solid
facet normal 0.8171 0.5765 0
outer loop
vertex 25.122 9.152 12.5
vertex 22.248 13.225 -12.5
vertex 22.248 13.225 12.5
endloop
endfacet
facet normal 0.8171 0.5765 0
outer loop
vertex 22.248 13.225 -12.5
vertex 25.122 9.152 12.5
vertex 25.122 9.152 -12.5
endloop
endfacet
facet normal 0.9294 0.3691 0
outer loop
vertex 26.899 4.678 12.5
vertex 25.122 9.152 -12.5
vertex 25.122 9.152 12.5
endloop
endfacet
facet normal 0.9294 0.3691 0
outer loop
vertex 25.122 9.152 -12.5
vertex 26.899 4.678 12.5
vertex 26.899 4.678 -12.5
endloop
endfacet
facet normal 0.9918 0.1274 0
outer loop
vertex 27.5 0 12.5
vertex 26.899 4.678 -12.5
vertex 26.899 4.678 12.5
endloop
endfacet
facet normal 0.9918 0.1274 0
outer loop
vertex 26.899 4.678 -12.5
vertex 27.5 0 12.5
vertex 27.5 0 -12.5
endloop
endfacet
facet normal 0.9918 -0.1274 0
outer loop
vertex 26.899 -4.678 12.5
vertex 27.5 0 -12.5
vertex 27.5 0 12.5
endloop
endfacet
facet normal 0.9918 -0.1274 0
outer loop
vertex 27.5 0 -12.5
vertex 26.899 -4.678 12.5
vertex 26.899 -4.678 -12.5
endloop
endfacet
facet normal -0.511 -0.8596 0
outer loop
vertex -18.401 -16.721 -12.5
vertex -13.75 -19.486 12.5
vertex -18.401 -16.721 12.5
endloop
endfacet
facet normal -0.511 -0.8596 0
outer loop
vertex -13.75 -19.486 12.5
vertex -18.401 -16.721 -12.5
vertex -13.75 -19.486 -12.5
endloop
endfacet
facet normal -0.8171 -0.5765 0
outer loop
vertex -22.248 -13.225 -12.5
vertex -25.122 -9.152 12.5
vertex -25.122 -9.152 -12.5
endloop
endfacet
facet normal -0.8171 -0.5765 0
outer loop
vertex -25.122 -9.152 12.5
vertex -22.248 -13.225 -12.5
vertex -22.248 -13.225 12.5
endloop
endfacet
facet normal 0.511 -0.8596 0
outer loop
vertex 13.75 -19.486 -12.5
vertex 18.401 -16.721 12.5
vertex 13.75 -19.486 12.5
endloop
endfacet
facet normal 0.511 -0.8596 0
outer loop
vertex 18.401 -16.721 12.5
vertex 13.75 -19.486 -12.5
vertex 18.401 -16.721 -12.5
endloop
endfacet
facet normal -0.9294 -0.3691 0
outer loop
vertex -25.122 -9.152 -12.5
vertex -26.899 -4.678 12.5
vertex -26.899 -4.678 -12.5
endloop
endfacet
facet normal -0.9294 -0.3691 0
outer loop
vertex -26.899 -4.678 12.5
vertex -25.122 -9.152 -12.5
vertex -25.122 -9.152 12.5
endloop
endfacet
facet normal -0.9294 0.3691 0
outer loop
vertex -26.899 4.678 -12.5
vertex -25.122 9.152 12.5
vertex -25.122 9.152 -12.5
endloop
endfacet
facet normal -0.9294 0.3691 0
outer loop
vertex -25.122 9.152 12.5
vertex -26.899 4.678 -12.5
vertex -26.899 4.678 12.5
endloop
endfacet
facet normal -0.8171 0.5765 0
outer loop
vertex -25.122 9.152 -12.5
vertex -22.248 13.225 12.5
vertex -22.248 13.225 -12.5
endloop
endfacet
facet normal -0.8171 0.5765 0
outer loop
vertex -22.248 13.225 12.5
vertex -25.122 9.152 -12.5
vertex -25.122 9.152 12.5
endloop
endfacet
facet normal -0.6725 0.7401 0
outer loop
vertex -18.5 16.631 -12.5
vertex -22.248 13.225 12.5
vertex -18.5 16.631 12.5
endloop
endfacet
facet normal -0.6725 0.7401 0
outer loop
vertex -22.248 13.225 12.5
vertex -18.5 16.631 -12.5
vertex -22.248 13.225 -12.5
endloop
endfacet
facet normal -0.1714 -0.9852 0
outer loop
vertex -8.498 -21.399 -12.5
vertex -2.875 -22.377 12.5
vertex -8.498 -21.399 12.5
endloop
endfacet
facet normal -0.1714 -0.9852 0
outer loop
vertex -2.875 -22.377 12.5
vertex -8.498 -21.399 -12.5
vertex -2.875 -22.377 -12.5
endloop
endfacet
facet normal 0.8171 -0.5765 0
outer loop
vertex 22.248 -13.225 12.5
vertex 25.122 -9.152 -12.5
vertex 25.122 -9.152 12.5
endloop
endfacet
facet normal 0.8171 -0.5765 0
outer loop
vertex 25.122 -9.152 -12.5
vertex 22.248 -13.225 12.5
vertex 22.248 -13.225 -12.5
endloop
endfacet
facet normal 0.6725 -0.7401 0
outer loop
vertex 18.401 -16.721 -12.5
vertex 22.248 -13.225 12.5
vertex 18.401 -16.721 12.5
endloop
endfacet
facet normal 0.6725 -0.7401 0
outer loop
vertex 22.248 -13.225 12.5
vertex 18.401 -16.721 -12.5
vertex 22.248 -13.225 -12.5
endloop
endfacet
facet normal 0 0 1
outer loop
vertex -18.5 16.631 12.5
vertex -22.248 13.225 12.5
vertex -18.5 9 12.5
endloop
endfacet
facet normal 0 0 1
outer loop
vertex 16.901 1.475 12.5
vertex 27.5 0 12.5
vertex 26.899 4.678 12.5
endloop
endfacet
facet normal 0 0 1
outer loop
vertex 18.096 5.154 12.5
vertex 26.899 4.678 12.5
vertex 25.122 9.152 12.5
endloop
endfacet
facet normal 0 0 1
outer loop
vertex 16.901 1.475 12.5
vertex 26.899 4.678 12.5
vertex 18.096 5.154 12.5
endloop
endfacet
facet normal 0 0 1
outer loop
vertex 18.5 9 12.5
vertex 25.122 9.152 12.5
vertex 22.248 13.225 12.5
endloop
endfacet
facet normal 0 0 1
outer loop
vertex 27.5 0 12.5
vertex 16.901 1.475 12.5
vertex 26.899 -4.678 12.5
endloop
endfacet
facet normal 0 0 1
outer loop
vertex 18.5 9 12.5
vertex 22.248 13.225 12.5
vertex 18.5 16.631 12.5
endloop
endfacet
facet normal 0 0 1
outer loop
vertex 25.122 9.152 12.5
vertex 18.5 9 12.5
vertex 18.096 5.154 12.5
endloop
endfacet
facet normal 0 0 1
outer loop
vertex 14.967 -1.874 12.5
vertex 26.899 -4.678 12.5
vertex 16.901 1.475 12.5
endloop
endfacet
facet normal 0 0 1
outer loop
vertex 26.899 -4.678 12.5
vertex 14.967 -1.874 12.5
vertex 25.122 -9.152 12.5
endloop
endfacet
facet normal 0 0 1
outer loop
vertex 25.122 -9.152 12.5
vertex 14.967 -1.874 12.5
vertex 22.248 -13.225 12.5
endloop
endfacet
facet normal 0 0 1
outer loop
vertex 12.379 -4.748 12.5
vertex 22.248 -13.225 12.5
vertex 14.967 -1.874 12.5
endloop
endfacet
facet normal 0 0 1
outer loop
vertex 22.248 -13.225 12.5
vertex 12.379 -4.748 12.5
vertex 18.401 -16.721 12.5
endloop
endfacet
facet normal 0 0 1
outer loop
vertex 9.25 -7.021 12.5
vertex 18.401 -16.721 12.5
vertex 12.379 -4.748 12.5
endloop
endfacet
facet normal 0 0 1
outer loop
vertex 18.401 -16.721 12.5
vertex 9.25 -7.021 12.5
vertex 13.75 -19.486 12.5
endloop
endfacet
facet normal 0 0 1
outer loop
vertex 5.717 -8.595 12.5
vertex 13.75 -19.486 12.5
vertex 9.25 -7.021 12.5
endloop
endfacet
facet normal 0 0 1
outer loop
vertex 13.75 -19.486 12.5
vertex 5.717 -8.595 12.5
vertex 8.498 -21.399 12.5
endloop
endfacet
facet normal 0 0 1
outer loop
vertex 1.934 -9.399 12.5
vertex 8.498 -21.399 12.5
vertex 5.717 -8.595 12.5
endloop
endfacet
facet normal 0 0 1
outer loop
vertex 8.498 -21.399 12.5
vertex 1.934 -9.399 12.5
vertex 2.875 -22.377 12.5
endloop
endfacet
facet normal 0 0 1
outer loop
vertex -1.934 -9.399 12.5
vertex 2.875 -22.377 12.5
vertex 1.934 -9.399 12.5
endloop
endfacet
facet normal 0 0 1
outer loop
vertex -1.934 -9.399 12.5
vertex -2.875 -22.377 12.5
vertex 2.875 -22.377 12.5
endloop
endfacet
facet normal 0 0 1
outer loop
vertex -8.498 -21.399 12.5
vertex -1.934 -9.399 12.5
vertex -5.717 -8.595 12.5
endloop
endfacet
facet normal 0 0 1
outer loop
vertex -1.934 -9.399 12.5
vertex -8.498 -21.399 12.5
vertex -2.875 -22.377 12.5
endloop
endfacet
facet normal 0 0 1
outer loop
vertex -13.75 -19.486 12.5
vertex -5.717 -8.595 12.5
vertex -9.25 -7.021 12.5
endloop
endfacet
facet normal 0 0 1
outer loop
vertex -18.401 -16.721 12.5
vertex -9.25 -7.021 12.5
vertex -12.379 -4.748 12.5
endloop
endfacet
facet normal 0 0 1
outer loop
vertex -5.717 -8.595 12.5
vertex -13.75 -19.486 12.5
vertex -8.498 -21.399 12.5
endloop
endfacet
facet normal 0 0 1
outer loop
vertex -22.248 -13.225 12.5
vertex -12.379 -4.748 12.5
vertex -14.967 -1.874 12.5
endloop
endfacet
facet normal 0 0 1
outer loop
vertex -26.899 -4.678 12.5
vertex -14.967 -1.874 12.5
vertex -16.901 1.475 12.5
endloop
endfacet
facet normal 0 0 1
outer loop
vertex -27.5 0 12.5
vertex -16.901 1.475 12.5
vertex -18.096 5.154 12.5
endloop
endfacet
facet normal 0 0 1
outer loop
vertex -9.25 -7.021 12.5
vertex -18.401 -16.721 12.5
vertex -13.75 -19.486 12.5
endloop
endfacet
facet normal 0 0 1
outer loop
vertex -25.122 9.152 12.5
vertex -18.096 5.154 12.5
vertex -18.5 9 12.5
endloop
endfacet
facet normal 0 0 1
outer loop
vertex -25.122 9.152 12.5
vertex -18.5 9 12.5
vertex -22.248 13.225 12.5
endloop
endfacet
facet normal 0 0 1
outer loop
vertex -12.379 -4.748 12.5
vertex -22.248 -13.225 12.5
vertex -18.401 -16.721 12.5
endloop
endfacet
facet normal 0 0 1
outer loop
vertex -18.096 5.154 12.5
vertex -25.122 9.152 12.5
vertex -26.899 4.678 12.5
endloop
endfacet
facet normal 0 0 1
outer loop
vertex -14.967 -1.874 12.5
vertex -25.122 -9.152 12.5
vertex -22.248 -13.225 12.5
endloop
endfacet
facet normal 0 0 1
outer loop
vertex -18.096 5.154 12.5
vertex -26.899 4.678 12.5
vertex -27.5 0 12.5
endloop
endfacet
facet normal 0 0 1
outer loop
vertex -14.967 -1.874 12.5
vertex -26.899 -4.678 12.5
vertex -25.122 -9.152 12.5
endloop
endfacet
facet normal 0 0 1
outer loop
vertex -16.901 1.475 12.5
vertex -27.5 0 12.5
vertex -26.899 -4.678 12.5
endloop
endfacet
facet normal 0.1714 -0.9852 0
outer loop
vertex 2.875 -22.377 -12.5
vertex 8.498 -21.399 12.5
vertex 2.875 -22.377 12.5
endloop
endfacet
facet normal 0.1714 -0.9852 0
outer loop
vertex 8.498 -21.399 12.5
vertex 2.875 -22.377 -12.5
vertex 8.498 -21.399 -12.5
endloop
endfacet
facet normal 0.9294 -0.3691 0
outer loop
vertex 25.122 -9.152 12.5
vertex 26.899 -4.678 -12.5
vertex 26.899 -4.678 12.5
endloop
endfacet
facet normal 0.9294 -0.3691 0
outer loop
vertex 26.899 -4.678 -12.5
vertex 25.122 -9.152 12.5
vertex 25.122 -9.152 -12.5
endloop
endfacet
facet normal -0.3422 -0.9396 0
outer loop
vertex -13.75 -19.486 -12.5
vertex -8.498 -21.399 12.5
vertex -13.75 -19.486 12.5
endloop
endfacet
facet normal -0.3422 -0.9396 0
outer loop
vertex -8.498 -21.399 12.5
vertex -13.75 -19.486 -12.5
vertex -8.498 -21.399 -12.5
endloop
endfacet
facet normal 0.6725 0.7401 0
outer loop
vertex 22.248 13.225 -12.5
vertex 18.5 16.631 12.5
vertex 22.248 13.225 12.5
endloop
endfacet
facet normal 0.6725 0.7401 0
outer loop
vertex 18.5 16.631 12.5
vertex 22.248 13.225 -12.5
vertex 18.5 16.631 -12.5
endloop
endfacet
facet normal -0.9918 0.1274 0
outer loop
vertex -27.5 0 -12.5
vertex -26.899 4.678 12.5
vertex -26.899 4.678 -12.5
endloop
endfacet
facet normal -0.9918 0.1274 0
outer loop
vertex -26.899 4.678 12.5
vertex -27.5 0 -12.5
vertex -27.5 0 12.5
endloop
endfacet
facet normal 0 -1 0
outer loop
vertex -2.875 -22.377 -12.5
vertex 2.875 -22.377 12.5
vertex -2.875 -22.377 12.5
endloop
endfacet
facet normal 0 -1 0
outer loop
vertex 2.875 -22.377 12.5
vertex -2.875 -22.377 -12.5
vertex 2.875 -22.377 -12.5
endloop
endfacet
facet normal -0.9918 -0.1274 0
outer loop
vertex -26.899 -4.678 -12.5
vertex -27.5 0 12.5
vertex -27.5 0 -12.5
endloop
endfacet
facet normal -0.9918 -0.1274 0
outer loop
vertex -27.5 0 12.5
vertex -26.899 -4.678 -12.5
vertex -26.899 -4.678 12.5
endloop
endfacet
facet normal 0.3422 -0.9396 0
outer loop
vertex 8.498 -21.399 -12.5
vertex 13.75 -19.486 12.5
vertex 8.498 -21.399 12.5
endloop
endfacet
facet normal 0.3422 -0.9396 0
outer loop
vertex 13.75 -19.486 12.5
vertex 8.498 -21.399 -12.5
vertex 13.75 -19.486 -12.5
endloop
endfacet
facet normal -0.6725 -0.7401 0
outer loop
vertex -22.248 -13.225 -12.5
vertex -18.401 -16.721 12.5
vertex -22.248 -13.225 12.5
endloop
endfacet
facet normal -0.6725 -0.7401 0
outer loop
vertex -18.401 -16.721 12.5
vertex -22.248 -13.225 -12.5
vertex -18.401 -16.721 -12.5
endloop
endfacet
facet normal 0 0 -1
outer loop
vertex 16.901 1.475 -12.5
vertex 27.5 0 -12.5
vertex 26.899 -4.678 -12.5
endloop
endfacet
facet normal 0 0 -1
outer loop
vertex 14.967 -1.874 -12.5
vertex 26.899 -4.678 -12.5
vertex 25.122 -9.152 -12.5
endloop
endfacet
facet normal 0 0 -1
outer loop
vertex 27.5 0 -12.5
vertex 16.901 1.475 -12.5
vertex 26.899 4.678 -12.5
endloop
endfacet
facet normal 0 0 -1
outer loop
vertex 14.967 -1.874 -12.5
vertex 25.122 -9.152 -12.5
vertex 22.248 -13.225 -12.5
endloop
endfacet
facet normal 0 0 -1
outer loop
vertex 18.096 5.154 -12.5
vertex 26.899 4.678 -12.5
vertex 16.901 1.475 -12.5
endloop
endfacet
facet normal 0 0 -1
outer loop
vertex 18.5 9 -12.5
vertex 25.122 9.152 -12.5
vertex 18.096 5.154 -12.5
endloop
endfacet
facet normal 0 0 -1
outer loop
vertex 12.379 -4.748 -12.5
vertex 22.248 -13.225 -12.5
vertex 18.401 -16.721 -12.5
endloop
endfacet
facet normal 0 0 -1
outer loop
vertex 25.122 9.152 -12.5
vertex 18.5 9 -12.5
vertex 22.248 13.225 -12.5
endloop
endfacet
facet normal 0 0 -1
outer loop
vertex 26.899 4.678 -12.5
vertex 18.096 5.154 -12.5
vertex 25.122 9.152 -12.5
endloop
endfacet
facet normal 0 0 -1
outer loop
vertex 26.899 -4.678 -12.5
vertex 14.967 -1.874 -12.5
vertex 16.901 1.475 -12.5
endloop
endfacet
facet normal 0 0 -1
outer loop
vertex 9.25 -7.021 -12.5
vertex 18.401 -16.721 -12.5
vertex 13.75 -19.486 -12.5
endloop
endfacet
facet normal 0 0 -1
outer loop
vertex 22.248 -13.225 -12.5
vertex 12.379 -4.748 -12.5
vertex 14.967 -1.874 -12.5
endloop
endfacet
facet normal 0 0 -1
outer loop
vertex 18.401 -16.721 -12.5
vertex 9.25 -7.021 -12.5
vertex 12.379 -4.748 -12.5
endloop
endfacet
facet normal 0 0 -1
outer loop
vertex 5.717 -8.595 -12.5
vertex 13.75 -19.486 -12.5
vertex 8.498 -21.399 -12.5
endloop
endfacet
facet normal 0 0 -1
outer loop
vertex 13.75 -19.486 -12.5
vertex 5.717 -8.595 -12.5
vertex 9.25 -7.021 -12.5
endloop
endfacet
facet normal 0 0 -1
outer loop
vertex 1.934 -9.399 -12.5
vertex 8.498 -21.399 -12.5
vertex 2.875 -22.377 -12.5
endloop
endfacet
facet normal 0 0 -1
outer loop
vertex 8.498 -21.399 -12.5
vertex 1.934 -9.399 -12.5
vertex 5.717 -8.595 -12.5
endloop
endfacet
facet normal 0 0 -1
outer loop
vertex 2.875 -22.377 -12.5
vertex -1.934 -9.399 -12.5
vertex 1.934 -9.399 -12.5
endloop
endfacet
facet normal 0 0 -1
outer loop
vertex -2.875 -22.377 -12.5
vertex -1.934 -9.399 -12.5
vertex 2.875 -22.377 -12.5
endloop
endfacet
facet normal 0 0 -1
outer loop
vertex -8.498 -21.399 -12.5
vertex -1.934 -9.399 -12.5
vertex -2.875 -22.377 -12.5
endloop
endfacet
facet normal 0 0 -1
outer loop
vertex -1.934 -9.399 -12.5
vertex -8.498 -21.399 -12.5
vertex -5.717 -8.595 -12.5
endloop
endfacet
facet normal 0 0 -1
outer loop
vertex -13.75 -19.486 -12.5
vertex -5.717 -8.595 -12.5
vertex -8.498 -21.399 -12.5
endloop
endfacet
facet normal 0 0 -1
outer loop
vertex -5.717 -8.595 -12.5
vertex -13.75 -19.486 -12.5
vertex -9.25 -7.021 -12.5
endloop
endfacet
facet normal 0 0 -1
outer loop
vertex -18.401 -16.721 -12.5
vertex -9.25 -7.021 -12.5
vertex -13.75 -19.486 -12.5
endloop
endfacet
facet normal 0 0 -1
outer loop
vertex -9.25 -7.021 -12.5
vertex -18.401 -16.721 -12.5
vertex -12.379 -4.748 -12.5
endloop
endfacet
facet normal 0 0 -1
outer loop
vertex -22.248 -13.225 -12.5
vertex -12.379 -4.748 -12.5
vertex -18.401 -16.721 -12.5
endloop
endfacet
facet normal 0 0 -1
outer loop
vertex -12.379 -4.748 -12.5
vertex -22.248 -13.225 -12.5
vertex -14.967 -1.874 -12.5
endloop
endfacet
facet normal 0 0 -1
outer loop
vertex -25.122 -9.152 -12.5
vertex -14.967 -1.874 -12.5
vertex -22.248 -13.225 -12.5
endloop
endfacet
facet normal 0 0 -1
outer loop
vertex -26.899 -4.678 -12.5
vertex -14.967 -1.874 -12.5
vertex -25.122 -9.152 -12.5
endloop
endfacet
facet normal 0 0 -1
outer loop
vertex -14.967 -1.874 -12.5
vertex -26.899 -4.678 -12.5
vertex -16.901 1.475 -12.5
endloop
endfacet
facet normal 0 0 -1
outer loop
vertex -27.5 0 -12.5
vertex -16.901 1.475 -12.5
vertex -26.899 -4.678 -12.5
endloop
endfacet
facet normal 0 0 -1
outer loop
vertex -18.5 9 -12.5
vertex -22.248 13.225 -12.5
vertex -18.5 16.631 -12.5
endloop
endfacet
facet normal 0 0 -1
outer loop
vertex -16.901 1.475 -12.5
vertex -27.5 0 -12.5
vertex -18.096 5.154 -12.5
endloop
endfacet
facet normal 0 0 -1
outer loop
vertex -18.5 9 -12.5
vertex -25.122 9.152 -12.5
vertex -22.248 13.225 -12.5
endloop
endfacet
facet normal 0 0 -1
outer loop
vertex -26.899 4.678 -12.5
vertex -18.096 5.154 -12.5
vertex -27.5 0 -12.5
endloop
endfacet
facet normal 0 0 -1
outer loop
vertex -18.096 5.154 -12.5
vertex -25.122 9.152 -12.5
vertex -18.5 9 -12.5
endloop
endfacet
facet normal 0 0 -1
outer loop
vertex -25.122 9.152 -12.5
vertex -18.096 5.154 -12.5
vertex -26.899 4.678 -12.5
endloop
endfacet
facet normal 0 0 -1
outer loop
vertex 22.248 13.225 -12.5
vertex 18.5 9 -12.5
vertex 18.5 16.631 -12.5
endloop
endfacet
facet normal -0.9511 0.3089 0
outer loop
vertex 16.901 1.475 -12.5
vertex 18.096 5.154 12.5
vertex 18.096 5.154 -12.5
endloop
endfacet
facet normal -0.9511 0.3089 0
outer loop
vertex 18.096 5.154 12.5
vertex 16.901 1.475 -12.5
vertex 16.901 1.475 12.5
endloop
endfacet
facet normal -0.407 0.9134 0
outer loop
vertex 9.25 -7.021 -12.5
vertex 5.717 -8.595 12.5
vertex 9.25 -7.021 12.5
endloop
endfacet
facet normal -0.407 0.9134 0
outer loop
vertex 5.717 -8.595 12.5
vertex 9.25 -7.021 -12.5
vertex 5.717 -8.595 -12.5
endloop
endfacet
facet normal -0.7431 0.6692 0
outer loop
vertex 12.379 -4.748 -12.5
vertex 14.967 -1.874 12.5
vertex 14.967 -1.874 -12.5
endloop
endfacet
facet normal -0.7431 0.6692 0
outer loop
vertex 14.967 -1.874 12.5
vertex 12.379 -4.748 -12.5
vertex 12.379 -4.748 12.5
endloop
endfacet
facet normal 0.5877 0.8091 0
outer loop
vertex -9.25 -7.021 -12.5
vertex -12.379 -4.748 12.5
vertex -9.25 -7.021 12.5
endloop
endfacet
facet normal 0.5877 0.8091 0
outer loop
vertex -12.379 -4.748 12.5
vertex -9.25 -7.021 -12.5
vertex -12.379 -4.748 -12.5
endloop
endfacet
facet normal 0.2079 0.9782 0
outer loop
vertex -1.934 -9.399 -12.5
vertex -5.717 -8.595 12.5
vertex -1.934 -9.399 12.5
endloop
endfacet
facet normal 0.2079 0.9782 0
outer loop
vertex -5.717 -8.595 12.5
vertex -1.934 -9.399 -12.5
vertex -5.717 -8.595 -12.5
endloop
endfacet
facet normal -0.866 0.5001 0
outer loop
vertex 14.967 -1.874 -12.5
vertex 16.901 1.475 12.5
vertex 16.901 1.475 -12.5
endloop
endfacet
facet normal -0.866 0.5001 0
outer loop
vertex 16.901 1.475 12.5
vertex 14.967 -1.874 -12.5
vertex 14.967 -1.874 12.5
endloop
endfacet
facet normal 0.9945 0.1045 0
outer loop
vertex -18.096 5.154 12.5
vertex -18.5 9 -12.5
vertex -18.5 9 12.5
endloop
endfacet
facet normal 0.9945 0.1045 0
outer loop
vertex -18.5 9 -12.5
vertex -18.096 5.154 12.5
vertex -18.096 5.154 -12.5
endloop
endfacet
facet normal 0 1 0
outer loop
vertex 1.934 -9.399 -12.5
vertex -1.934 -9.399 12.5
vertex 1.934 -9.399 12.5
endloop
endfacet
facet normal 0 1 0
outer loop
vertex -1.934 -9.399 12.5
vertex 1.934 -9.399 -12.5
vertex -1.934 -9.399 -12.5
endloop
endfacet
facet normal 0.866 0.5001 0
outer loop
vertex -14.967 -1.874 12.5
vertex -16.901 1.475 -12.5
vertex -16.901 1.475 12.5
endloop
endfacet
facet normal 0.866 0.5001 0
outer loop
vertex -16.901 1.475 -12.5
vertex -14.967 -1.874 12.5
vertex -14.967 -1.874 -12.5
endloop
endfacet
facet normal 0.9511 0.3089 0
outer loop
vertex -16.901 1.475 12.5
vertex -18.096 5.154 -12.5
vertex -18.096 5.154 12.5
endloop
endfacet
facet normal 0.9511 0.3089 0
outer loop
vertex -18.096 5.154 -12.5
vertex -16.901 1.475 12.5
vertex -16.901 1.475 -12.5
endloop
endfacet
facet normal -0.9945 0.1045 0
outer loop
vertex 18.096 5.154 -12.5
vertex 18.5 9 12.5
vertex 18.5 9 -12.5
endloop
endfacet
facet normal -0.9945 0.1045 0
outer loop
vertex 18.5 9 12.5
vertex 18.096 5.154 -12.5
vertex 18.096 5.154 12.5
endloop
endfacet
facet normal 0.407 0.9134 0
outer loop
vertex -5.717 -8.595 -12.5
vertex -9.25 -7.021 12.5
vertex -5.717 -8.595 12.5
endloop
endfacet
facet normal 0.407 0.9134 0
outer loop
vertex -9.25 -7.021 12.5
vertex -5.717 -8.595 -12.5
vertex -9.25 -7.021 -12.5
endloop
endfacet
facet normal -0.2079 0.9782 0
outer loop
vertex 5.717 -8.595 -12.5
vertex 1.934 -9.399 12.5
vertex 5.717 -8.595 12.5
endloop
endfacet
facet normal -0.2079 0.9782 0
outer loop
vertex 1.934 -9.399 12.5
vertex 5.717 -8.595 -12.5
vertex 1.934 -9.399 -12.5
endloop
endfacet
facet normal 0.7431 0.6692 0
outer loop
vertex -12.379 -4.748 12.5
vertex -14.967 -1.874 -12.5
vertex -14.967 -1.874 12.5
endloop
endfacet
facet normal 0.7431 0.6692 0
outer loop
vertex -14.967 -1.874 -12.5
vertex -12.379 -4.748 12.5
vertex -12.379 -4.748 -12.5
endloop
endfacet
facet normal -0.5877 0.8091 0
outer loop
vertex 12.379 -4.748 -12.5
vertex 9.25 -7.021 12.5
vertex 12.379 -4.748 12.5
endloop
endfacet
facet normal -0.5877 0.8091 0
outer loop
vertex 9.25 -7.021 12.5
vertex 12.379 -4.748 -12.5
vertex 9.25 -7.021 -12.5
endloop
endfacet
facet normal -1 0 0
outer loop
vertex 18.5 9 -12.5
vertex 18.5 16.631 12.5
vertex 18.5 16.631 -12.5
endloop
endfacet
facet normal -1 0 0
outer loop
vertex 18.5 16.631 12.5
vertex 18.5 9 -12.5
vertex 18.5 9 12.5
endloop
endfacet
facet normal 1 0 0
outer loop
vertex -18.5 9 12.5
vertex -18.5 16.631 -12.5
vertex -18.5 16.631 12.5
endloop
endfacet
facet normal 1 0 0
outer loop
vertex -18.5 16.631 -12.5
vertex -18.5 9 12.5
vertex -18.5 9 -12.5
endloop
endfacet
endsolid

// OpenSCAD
//Handlebar Watch/GPS Holder by eriqjo
//
//v0.2 Moved the mount forward on the handlebar so it can actually be installed
//v0.1 Initial release
//

//CUSTOMIZER VARIABLES

/* [Measurements] */

//How wide is the wrist strap, mm?
Strap_Width = 25;

//Simulated wrist diameter (thickest), mm
Wrist_Dia_A = 55;

//Simulated wrist diameter (thinnest), mm
Wrist_Dia_B = 45;

//Diameter of the handlebar, mm
HB_Diameter = 37;

//END CUSTOMIZER VARIABLES

difference(){
	scale([Wrist_Dia_A, Wrist_Dia_B, 1])
		cylinder(h = Strap_Width, r = 0.5, center = true, $fn = 30);
	translate([0,5 + (Wrist_Dia_B - HB_Diameter)/2, 0])
		cylinder(h = Strap_Width +1, r = HB_Diameter/2, center = true);
	translate([0,5 + (Wrist_Dia_B - HB_Diameter)/2 + (Wrist_Dia_B/2 + 1)/2, 0])
		cube([HB_Diameter, Wrist_Dia_B/2 + 1, Strap_Width +1], center = true);
} //d
